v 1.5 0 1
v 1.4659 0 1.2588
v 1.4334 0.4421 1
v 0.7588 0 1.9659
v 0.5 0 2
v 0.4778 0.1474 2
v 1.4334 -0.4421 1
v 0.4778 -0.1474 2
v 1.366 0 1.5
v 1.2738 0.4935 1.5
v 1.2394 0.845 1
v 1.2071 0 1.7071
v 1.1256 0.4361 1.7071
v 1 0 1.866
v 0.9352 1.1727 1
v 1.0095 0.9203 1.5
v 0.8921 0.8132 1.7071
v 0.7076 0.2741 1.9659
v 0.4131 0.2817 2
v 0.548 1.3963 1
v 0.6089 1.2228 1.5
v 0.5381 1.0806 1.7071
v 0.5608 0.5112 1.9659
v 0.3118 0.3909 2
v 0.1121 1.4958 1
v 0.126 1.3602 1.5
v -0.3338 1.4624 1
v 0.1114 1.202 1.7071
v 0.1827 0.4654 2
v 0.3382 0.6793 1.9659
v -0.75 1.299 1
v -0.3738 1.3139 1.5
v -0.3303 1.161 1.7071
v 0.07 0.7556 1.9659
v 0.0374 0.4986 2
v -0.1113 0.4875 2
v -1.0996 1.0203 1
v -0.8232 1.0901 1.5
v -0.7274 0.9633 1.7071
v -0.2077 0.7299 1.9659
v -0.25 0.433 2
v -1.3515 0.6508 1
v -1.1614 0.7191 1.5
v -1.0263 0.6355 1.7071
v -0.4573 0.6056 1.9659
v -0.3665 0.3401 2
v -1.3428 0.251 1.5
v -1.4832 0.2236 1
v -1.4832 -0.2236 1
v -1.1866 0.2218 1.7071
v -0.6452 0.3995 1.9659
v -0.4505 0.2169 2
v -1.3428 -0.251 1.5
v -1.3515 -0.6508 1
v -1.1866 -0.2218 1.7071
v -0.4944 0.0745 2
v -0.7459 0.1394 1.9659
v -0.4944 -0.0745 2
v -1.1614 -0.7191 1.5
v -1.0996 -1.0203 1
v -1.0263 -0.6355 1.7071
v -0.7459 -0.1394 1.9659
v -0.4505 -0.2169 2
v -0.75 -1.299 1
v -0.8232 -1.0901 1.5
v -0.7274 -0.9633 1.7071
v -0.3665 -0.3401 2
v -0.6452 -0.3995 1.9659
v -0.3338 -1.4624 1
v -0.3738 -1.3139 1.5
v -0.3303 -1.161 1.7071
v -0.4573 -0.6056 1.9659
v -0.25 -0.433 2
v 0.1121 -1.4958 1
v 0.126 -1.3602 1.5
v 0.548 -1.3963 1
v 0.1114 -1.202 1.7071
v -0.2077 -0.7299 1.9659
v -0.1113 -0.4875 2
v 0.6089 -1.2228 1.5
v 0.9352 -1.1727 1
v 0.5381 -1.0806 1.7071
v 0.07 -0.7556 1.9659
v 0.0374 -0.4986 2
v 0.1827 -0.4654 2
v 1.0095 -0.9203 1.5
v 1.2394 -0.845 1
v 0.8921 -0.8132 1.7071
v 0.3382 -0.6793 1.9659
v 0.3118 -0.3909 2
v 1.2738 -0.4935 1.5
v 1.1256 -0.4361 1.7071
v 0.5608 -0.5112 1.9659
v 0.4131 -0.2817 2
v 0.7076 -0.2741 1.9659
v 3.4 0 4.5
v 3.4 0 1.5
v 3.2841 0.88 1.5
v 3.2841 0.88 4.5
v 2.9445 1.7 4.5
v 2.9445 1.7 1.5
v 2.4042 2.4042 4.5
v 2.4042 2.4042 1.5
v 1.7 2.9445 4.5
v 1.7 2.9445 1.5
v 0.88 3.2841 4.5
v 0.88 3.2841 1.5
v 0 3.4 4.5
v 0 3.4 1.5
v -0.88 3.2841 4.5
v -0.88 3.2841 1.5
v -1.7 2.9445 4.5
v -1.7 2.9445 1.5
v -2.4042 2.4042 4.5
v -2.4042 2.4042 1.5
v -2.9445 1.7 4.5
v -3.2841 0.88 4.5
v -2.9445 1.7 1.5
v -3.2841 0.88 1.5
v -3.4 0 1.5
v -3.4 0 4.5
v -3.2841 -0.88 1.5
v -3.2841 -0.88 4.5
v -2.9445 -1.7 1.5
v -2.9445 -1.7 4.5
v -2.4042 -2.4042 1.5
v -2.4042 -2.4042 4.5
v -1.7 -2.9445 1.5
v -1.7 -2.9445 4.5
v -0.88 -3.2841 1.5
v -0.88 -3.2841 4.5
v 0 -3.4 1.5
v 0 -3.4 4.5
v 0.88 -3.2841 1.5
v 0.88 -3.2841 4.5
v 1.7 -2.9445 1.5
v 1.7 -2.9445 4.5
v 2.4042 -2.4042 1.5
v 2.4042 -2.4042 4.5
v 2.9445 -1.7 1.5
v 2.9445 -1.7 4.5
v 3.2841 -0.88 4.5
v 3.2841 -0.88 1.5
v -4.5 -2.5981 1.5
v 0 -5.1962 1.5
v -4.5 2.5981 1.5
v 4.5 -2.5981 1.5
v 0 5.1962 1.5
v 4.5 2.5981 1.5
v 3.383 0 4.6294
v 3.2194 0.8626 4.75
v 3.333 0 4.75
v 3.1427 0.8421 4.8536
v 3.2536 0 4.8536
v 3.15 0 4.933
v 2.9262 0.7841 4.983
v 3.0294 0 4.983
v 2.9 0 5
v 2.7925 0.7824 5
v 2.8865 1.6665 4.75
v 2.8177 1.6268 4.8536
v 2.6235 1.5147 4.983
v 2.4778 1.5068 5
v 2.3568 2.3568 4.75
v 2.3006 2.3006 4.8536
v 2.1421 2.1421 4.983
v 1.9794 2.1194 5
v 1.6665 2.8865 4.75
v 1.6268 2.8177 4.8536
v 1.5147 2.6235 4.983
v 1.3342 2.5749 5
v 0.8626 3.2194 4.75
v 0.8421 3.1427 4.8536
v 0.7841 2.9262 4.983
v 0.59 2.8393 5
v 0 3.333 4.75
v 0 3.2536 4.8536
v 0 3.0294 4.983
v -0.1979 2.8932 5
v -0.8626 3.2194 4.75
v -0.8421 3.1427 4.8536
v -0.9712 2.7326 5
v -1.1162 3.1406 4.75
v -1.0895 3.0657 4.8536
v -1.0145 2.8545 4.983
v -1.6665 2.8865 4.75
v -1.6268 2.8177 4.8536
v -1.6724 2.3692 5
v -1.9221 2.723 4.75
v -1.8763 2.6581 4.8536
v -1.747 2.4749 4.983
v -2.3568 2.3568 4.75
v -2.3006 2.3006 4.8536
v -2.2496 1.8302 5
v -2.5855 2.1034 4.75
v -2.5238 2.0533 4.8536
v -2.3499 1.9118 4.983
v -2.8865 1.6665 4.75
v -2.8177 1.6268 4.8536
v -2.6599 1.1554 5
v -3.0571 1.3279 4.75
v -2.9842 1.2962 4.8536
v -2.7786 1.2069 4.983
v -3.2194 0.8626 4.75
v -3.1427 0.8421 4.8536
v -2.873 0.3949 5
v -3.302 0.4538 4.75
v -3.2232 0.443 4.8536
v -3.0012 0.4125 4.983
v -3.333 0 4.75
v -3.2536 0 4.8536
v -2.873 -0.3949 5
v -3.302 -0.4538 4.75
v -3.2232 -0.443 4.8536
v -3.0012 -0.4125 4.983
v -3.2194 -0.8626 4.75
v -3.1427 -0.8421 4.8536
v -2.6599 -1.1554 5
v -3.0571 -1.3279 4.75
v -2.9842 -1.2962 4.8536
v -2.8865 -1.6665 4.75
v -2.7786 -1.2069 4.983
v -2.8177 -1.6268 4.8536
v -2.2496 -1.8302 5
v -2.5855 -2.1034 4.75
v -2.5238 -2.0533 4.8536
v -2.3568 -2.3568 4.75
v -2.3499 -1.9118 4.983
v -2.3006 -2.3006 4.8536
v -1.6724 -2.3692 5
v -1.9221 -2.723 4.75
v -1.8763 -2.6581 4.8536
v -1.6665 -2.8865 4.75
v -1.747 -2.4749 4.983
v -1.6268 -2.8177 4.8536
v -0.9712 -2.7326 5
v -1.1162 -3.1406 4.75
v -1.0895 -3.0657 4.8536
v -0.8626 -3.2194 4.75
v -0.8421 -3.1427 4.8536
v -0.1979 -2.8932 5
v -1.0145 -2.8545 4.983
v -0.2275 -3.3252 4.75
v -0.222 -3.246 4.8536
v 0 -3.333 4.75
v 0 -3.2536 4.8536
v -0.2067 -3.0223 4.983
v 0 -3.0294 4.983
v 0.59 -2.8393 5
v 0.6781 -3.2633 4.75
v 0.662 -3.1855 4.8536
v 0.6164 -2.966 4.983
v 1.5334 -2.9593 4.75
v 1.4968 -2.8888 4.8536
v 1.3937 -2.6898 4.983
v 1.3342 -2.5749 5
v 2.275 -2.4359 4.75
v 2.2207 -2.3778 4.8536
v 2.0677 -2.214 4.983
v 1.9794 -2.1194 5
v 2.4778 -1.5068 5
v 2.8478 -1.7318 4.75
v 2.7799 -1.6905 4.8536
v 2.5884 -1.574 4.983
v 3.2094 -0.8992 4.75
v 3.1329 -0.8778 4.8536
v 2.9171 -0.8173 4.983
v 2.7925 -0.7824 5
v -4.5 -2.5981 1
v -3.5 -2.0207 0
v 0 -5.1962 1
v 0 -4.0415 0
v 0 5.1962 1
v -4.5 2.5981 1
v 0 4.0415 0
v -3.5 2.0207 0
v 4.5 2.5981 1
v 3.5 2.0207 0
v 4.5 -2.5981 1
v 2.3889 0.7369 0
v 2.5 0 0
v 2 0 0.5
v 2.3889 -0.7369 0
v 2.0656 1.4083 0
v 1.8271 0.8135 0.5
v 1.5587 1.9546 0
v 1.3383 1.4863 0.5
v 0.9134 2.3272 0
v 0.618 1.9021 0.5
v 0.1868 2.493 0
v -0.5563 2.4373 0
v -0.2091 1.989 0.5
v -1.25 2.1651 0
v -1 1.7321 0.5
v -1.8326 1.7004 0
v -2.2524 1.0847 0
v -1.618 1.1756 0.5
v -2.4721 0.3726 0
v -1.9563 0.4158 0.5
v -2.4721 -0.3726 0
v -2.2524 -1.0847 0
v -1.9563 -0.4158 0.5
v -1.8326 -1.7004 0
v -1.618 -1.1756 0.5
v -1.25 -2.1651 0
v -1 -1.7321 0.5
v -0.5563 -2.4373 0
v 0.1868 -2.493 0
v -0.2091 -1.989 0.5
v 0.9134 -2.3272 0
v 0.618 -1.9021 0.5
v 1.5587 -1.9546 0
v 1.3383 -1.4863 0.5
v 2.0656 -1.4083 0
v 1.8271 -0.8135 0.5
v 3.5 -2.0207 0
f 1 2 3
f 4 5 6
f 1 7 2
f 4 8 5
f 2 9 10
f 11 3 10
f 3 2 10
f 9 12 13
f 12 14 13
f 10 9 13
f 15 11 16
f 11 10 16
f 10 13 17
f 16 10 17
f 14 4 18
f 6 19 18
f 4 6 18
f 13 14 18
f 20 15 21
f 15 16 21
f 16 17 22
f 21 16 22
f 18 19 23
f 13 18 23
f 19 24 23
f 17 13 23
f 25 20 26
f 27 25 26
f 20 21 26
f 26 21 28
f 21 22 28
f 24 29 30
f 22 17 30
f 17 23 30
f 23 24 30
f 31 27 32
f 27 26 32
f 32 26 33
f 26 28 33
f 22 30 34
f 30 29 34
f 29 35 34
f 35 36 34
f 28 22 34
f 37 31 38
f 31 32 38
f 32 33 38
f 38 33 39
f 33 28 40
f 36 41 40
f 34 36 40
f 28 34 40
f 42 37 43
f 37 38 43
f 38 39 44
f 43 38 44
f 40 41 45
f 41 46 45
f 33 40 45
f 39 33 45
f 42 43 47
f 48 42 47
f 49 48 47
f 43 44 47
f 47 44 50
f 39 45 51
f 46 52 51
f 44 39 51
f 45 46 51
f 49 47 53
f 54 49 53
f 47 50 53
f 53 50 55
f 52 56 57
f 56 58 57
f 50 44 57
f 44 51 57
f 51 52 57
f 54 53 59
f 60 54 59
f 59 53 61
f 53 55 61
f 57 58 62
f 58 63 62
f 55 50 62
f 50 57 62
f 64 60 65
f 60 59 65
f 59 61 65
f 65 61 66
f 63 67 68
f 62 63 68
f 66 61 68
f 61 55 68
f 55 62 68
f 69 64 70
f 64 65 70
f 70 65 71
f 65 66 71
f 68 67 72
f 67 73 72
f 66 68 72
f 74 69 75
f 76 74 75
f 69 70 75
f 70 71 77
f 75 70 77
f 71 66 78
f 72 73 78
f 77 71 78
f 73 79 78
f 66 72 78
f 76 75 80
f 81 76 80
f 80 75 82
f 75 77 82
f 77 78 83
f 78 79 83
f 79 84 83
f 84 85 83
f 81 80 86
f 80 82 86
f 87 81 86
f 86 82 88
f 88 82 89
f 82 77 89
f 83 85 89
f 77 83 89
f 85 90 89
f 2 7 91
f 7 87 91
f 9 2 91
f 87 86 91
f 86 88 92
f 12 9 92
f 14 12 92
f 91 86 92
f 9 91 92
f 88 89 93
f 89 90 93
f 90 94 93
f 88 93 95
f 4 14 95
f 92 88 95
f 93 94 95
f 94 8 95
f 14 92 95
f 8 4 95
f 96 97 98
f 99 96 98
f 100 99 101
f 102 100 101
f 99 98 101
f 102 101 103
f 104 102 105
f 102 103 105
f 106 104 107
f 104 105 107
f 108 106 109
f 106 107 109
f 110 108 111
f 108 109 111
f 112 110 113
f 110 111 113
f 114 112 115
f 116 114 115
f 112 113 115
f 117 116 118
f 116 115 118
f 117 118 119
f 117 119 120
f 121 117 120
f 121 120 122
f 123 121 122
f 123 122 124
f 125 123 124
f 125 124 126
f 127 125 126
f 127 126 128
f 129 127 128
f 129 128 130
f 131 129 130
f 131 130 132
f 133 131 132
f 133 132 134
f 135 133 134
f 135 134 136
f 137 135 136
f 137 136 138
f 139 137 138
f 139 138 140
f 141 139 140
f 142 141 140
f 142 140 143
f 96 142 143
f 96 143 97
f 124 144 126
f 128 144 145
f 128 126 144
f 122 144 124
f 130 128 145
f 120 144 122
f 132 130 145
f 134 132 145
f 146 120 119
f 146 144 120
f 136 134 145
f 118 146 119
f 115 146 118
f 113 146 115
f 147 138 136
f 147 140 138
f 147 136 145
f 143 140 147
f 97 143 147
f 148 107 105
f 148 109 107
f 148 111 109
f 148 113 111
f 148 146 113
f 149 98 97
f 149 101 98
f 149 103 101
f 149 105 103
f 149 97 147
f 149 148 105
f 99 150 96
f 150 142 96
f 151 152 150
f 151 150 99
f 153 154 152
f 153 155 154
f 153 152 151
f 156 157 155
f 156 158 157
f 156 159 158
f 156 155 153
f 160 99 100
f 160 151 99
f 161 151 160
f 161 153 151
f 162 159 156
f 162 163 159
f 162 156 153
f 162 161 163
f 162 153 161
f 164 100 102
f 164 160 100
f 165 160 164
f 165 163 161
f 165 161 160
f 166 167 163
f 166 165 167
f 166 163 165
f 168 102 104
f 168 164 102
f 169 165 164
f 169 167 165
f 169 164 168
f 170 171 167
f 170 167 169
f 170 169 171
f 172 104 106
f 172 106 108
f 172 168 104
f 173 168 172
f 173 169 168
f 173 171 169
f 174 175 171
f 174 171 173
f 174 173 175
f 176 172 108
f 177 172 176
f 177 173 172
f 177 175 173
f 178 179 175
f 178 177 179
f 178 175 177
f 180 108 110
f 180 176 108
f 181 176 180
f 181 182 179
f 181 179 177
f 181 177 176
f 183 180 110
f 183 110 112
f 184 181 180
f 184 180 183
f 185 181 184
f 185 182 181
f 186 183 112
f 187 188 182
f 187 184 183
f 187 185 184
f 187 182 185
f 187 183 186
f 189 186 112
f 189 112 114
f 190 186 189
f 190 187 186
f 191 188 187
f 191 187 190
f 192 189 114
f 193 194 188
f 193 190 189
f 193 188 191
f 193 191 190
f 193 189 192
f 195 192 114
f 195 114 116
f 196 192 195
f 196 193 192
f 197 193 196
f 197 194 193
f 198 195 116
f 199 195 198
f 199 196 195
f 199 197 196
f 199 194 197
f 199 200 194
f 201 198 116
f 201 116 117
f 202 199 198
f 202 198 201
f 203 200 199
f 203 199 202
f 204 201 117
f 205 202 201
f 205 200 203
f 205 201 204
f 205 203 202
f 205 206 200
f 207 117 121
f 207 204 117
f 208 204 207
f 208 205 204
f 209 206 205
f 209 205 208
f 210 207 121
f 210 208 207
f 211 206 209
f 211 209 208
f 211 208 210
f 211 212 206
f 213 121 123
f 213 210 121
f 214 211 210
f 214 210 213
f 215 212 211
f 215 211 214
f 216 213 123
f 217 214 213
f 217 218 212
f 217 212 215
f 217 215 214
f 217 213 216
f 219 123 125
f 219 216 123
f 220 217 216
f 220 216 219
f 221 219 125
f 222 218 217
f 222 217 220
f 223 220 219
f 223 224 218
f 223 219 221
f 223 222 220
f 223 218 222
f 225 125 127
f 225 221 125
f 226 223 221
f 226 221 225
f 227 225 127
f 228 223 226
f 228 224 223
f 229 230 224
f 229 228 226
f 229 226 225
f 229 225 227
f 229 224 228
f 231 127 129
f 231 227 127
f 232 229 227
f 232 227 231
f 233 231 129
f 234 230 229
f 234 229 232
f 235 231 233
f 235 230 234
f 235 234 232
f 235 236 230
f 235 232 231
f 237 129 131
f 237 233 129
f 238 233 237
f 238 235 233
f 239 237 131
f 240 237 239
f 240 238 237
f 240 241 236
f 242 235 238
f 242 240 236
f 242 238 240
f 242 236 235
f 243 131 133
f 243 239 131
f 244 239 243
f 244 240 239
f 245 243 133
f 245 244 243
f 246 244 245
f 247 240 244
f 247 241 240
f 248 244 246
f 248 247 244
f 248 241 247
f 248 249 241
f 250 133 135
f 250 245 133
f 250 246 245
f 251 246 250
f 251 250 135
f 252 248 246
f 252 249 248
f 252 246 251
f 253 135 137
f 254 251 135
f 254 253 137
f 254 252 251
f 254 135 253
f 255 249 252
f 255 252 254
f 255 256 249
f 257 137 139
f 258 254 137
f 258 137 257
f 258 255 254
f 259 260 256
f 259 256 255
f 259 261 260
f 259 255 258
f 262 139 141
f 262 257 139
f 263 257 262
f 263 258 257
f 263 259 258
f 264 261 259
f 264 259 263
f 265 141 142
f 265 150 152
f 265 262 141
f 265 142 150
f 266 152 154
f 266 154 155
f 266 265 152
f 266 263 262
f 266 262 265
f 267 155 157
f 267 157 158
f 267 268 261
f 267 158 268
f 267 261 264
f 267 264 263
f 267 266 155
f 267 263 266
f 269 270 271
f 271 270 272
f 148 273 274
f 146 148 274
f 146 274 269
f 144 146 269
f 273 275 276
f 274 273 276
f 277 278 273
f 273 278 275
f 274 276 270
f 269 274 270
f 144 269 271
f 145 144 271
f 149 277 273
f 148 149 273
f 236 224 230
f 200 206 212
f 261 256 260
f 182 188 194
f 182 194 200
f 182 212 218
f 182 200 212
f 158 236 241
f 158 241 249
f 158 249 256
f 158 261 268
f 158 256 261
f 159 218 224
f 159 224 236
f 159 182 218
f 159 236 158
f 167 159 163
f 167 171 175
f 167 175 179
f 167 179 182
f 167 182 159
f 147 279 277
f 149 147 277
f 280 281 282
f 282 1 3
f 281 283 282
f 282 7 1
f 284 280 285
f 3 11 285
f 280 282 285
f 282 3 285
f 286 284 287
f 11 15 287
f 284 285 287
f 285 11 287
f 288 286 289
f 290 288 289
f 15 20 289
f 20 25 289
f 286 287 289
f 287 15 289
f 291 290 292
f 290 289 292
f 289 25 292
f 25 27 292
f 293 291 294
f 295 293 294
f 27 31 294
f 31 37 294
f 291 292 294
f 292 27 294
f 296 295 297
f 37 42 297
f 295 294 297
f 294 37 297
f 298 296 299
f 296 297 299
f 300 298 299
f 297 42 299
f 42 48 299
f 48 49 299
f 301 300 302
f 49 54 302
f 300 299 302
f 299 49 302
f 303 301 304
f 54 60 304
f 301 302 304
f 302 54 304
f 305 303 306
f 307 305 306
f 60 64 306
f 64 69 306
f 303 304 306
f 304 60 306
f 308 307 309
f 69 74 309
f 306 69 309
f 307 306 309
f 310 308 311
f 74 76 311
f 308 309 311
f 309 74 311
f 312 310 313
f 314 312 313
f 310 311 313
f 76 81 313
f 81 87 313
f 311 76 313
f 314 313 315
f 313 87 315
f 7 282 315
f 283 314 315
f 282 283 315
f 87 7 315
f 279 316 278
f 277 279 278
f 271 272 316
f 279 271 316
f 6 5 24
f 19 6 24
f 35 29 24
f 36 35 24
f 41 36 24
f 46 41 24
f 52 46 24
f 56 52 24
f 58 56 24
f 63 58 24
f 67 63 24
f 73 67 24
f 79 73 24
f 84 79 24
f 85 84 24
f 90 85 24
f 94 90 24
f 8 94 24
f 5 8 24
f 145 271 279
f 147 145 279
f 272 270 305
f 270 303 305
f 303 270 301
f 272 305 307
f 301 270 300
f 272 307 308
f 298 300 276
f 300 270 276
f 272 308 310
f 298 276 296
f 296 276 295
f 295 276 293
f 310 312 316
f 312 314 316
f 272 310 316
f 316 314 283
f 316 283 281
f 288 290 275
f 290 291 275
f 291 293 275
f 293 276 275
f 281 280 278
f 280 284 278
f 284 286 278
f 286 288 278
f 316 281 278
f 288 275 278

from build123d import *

# Parameters (mm, degrees)
F0_R     = 3.4
F1_DEPTH = 1.5
F0_R_2   = 1.5
F2_DEPTH = 5
F3_DEPTH = 2
F4_SIZE  = 1
F5_R     = 0.99999
F6_R     = 0.5


# Not quite as in the source:
# - a fillet or chamfer is up to 0.001 mm smaller than in the source, because OpenCascade refuses the exact size


with BuildPart() as f1:
    # F0 (on Top) → F1 (new body)
    with BuildSketch(Plane.XY):
        Polygon((4.5, -2.5980762114), (4.5, 2.5980762114), (0, 5.1961524227), (-4.5, 2.5980762114), (-4.5, -2.5980762114), (0, -5.1961524227), align=None)
        Circle(F0_R, mode=Mode.SUBTRACT)
    extrude(amount=F1_DEPTH)

    # F0 (on Top) → F2 (join)
    with BuildSketch(Plane.XY):
        Circle(F0_R)
        Circle(F0_R_2, mode=Mode.SUBTRACT)
        Circle(F0_R_2)
    extrude(amount=F2_DEPTH)

    # F0 (on Top) → F3 (cut)
    with BuildSketch(Plane.XY):
        Circle(F0_R_2)
    extrude(amount=F3_DEPTH, mode=Mode.SUBTRACT)

    # F4
    f4_edges = [f1.edges().sort_by_distance(p)[0] for p in [
        (4.5, 0, 0),
        (2.25, -3.897114, 0),
        (2.25, 3.897114, 0),
        (-2.25, -3.897114, 0),
        (-2.25, 3.897114, 0),
        (-4.5, 0, 0),
        (-1.5, 0, 0),
    ]]
    chamfer(f4_edges, length=F4_SIZE)

    # F5 (radius 1 in the source; OpenCascade refuses exactly that, so slightly less here)
    f5_edges = [f1.edges().sort_by_distance(p)[0] for p in [
        (-1.5, 0, 2),
    ]]
    fillet(f5_edges, radius=F5_R)

    # F6
    f6_edges = [f1.edges().sort_by_distance(p)[0] for p in [
        (-3.4, 0, 5),
    ]]
    fillet(f6_edges, radius=F6_R)


solid = f1.part
